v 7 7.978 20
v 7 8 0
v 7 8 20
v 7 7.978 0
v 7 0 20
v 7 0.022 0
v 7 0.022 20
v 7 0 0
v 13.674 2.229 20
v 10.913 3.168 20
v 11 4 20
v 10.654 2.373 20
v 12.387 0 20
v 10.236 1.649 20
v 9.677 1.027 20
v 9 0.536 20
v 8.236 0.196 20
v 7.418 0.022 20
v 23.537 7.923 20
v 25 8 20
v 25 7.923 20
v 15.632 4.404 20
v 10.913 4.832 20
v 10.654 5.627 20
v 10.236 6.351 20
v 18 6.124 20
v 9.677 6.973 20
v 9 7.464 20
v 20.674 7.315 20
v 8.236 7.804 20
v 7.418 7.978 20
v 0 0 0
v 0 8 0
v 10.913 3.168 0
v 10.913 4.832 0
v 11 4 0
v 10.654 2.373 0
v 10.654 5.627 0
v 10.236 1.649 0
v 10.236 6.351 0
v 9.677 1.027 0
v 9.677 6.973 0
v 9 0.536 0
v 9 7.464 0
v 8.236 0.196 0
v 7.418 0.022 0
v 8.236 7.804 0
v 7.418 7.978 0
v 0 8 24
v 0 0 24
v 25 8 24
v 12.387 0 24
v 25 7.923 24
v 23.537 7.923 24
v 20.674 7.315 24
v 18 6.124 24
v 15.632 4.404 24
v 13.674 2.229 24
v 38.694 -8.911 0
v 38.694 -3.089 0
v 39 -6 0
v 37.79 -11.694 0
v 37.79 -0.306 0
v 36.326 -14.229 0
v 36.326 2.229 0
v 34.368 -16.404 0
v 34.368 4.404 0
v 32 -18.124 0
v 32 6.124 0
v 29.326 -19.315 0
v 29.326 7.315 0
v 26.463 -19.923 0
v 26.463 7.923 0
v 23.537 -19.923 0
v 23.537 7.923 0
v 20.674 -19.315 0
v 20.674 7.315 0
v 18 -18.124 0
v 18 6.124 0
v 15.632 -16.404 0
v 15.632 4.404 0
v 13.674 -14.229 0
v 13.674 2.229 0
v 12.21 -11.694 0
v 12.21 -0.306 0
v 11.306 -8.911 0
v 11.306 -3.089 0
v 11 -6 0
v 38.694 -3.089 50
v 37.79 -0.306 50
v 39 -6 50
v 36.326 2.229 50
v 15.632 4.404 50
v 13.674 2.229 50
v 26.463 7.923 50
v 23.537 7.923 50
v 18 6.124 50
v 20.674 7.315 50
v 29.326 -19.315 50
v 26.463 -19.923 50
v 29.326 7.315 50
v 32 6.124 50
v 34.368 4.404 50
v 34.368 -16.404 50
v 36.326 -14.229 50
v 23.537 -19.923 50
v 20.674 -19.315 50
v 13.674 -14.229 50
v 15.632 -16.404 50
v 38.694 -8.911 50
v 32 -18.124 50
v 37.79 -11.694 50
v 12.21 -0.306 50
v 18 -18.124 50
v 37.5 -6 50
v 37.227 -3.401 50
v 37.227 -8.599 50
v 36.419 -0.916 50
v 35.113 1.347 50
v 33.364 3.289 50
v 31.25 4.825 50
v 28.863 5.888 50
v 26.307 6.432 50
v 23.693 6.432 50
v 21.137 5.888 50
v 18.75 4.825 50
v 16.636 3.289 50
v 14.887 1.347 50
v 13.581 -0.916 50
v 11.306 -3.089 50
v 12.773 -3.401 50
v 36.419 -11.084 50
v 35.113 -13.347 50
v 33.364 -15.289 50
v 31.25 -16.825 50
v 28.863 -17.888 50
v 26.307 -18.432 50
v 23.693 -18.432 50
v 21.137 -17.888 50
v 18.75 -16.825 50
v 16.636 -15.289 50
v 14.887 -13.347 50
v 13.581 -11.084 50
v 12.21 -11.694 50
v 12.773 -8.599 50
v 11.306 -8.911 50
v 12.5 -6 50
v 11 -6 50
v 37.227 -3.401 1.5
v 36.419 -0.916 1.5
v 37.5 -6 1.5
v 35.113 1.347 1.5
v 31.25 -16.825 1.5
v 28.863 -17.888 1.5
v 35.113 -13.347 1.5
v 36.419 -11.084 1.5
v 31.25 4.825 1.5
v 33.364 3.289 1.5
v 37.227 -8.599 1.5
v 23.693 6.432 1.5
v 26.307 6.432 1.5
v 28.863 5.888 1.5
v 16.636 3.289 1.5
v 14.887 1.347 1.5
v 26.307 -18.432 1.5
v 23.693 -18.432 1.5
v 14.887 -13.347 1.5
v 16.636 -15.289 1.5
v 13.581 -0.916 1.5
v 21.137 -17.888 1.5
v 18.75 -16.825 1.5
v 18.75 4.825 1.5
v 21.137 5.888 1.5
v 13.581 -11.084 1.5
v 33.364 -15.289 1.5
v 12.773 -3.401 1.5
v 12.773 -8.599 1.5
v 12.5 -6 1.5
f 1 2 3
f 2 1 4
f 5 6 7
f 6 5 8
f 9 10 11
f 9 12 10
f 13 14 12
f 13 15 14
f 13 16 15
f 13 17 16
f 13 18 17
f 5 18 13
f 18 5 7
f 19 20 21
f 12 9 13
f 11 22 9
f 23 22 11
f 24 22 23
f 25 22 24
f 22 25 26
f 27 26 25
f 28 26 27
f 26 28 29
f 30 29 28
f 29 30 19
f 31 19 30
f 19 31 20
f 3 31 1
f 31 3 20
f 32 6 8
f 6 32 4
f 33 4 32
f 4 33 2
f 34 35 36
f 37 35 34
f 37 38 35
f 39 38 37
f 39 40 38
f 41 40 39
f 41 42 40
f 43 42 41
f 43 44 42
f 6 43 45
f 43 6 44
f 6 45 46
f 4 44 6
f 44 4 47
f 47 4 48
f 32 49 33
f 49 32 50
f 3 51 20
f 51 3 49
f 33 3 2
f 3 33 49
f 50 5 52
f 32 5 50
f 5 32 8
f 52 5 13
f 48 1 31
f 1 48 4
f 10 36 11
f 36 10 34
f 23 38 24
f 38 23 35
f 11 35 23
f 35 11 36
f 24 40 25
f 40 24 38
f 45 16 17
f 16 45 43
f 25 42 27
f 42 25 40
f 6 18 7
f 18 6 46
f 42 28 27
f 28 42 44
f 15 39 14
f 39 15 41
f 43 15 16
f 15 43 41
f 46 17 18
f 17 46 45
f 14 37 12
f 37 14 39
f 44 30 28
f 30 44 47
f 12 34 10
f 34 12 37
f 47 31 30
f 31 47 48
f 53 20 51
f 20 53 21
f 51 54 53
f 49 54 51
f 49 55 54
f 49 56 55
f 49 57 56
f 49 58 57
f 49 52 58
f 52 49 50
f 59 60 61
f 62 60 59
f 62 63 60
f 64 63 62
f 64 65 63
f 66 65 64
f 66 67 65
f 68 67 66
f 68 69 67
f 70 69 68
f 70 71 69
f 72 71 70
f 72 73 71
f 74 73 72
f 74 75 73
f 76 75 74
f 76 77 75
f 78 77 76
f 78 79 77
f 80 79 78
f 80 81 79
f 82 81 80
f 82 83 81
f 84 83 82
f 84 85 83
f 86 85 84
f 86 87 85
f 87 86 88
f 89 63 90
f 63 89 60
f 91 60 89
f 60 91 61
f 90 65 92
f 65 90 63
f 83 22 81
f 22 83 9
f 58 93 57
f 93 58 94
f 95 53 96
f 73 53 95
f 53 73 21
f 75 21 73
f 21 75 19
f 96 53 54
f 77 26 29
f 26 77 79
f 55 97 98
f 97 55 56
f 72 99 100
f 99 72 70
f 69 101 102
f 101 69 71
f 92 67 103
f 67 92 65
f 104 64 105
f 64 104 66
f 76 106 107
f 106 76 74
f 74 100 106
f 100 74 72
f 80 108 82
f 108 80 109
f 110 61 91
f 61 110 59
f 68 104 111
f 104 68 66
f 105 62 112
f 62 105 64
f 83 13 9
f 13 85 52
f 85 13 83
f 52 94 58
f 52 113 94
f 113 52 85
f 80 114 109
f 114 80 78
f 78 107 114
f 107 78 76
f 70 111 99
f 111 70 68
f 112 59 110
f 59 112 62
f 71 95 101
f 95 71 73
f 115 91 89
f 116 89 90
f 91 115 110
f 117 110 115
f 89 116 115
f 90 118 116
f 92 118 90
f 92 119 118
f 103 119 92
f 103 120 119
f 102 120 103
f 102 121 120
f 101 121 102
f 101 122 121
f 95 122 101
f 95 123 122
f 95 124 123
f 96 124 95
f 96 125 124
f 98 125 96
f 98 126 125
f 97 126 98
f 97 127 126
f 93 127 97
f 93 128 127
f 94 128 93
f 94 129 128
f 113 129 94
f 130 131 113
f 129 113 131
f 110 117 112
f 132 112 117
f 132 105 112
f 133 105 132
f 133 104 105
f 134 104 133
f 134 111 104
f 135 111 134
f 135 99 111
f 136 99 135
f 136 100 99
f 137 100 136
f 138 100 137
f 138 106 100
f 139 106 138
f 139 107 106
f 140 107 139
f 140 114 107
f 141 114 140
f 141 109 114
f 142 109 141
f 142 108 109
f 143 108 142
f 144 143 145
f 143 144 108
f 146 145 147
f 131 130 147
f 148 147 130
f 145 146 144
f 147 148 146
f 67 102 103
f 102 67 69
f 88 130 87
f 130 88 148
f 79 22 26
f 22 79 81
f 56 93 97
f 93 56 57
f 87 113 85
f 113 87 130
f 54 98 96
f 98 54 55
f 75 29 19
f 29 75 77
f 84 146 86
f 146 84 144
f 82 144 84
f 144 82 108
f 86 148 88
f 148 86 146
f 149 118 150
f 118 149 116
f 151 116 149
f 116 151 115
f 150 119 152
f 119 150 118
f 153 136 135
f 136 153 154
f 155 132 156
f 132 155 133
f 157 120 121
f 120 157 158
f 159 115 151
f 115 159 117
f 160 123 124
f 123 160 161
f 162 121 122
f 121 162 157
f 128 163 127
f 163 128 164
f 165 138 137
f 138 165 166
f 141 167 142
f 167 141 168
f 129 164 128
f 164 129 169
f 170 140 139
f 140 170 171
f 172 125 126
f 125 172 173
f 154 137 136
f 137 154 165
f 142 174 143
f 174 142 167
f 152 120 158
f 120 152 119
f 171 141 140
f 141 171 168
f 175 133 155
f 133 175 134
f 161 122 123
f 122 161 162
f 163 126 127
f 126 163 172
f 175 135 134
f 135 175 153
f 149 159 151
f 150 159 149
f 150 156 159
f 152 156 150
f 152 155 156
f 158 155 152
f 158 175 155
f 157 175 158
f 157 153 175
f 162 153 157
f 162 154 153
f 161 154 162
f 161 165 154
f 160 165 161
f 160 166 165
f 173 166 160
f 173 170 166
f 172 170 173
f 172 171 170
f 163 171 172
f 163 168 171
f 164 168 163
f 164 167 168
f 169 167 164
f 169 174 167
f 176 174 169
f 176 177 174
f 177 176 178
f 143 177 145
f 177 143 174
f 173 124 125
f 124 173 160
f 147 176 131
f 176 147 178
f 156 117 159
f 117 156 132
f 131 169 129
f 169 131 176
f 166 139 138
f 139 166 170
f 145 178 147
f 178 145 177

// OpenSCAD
holderDiameter = 25 + 2*1.5;
cubeLen = 7+8/2 + 0 + holderDiameter/2;

difference()
{
  union()
  {
    // mounting rod
    cube([7,8,20]);
    translate([7,8/2,0])
      cylinder(r=8/2, h=20, $fs=0.1);
    
    // connecting bar
    translate([0, 0, 20])
      cube([cubeLen, 8, 4]);
    
    // marker holder - main part
    translate([cubeLen, -holderDiameter/2+8, 0])
      cylinder(r=(holderDiameter)/2, h=50);
  }
  // marker holder drill
  translate([cubeLen, -holderDiameter/2+8, 0])
    translate([0, 0, 1.5])
      cylinder(r=25/2, h=50);
}
